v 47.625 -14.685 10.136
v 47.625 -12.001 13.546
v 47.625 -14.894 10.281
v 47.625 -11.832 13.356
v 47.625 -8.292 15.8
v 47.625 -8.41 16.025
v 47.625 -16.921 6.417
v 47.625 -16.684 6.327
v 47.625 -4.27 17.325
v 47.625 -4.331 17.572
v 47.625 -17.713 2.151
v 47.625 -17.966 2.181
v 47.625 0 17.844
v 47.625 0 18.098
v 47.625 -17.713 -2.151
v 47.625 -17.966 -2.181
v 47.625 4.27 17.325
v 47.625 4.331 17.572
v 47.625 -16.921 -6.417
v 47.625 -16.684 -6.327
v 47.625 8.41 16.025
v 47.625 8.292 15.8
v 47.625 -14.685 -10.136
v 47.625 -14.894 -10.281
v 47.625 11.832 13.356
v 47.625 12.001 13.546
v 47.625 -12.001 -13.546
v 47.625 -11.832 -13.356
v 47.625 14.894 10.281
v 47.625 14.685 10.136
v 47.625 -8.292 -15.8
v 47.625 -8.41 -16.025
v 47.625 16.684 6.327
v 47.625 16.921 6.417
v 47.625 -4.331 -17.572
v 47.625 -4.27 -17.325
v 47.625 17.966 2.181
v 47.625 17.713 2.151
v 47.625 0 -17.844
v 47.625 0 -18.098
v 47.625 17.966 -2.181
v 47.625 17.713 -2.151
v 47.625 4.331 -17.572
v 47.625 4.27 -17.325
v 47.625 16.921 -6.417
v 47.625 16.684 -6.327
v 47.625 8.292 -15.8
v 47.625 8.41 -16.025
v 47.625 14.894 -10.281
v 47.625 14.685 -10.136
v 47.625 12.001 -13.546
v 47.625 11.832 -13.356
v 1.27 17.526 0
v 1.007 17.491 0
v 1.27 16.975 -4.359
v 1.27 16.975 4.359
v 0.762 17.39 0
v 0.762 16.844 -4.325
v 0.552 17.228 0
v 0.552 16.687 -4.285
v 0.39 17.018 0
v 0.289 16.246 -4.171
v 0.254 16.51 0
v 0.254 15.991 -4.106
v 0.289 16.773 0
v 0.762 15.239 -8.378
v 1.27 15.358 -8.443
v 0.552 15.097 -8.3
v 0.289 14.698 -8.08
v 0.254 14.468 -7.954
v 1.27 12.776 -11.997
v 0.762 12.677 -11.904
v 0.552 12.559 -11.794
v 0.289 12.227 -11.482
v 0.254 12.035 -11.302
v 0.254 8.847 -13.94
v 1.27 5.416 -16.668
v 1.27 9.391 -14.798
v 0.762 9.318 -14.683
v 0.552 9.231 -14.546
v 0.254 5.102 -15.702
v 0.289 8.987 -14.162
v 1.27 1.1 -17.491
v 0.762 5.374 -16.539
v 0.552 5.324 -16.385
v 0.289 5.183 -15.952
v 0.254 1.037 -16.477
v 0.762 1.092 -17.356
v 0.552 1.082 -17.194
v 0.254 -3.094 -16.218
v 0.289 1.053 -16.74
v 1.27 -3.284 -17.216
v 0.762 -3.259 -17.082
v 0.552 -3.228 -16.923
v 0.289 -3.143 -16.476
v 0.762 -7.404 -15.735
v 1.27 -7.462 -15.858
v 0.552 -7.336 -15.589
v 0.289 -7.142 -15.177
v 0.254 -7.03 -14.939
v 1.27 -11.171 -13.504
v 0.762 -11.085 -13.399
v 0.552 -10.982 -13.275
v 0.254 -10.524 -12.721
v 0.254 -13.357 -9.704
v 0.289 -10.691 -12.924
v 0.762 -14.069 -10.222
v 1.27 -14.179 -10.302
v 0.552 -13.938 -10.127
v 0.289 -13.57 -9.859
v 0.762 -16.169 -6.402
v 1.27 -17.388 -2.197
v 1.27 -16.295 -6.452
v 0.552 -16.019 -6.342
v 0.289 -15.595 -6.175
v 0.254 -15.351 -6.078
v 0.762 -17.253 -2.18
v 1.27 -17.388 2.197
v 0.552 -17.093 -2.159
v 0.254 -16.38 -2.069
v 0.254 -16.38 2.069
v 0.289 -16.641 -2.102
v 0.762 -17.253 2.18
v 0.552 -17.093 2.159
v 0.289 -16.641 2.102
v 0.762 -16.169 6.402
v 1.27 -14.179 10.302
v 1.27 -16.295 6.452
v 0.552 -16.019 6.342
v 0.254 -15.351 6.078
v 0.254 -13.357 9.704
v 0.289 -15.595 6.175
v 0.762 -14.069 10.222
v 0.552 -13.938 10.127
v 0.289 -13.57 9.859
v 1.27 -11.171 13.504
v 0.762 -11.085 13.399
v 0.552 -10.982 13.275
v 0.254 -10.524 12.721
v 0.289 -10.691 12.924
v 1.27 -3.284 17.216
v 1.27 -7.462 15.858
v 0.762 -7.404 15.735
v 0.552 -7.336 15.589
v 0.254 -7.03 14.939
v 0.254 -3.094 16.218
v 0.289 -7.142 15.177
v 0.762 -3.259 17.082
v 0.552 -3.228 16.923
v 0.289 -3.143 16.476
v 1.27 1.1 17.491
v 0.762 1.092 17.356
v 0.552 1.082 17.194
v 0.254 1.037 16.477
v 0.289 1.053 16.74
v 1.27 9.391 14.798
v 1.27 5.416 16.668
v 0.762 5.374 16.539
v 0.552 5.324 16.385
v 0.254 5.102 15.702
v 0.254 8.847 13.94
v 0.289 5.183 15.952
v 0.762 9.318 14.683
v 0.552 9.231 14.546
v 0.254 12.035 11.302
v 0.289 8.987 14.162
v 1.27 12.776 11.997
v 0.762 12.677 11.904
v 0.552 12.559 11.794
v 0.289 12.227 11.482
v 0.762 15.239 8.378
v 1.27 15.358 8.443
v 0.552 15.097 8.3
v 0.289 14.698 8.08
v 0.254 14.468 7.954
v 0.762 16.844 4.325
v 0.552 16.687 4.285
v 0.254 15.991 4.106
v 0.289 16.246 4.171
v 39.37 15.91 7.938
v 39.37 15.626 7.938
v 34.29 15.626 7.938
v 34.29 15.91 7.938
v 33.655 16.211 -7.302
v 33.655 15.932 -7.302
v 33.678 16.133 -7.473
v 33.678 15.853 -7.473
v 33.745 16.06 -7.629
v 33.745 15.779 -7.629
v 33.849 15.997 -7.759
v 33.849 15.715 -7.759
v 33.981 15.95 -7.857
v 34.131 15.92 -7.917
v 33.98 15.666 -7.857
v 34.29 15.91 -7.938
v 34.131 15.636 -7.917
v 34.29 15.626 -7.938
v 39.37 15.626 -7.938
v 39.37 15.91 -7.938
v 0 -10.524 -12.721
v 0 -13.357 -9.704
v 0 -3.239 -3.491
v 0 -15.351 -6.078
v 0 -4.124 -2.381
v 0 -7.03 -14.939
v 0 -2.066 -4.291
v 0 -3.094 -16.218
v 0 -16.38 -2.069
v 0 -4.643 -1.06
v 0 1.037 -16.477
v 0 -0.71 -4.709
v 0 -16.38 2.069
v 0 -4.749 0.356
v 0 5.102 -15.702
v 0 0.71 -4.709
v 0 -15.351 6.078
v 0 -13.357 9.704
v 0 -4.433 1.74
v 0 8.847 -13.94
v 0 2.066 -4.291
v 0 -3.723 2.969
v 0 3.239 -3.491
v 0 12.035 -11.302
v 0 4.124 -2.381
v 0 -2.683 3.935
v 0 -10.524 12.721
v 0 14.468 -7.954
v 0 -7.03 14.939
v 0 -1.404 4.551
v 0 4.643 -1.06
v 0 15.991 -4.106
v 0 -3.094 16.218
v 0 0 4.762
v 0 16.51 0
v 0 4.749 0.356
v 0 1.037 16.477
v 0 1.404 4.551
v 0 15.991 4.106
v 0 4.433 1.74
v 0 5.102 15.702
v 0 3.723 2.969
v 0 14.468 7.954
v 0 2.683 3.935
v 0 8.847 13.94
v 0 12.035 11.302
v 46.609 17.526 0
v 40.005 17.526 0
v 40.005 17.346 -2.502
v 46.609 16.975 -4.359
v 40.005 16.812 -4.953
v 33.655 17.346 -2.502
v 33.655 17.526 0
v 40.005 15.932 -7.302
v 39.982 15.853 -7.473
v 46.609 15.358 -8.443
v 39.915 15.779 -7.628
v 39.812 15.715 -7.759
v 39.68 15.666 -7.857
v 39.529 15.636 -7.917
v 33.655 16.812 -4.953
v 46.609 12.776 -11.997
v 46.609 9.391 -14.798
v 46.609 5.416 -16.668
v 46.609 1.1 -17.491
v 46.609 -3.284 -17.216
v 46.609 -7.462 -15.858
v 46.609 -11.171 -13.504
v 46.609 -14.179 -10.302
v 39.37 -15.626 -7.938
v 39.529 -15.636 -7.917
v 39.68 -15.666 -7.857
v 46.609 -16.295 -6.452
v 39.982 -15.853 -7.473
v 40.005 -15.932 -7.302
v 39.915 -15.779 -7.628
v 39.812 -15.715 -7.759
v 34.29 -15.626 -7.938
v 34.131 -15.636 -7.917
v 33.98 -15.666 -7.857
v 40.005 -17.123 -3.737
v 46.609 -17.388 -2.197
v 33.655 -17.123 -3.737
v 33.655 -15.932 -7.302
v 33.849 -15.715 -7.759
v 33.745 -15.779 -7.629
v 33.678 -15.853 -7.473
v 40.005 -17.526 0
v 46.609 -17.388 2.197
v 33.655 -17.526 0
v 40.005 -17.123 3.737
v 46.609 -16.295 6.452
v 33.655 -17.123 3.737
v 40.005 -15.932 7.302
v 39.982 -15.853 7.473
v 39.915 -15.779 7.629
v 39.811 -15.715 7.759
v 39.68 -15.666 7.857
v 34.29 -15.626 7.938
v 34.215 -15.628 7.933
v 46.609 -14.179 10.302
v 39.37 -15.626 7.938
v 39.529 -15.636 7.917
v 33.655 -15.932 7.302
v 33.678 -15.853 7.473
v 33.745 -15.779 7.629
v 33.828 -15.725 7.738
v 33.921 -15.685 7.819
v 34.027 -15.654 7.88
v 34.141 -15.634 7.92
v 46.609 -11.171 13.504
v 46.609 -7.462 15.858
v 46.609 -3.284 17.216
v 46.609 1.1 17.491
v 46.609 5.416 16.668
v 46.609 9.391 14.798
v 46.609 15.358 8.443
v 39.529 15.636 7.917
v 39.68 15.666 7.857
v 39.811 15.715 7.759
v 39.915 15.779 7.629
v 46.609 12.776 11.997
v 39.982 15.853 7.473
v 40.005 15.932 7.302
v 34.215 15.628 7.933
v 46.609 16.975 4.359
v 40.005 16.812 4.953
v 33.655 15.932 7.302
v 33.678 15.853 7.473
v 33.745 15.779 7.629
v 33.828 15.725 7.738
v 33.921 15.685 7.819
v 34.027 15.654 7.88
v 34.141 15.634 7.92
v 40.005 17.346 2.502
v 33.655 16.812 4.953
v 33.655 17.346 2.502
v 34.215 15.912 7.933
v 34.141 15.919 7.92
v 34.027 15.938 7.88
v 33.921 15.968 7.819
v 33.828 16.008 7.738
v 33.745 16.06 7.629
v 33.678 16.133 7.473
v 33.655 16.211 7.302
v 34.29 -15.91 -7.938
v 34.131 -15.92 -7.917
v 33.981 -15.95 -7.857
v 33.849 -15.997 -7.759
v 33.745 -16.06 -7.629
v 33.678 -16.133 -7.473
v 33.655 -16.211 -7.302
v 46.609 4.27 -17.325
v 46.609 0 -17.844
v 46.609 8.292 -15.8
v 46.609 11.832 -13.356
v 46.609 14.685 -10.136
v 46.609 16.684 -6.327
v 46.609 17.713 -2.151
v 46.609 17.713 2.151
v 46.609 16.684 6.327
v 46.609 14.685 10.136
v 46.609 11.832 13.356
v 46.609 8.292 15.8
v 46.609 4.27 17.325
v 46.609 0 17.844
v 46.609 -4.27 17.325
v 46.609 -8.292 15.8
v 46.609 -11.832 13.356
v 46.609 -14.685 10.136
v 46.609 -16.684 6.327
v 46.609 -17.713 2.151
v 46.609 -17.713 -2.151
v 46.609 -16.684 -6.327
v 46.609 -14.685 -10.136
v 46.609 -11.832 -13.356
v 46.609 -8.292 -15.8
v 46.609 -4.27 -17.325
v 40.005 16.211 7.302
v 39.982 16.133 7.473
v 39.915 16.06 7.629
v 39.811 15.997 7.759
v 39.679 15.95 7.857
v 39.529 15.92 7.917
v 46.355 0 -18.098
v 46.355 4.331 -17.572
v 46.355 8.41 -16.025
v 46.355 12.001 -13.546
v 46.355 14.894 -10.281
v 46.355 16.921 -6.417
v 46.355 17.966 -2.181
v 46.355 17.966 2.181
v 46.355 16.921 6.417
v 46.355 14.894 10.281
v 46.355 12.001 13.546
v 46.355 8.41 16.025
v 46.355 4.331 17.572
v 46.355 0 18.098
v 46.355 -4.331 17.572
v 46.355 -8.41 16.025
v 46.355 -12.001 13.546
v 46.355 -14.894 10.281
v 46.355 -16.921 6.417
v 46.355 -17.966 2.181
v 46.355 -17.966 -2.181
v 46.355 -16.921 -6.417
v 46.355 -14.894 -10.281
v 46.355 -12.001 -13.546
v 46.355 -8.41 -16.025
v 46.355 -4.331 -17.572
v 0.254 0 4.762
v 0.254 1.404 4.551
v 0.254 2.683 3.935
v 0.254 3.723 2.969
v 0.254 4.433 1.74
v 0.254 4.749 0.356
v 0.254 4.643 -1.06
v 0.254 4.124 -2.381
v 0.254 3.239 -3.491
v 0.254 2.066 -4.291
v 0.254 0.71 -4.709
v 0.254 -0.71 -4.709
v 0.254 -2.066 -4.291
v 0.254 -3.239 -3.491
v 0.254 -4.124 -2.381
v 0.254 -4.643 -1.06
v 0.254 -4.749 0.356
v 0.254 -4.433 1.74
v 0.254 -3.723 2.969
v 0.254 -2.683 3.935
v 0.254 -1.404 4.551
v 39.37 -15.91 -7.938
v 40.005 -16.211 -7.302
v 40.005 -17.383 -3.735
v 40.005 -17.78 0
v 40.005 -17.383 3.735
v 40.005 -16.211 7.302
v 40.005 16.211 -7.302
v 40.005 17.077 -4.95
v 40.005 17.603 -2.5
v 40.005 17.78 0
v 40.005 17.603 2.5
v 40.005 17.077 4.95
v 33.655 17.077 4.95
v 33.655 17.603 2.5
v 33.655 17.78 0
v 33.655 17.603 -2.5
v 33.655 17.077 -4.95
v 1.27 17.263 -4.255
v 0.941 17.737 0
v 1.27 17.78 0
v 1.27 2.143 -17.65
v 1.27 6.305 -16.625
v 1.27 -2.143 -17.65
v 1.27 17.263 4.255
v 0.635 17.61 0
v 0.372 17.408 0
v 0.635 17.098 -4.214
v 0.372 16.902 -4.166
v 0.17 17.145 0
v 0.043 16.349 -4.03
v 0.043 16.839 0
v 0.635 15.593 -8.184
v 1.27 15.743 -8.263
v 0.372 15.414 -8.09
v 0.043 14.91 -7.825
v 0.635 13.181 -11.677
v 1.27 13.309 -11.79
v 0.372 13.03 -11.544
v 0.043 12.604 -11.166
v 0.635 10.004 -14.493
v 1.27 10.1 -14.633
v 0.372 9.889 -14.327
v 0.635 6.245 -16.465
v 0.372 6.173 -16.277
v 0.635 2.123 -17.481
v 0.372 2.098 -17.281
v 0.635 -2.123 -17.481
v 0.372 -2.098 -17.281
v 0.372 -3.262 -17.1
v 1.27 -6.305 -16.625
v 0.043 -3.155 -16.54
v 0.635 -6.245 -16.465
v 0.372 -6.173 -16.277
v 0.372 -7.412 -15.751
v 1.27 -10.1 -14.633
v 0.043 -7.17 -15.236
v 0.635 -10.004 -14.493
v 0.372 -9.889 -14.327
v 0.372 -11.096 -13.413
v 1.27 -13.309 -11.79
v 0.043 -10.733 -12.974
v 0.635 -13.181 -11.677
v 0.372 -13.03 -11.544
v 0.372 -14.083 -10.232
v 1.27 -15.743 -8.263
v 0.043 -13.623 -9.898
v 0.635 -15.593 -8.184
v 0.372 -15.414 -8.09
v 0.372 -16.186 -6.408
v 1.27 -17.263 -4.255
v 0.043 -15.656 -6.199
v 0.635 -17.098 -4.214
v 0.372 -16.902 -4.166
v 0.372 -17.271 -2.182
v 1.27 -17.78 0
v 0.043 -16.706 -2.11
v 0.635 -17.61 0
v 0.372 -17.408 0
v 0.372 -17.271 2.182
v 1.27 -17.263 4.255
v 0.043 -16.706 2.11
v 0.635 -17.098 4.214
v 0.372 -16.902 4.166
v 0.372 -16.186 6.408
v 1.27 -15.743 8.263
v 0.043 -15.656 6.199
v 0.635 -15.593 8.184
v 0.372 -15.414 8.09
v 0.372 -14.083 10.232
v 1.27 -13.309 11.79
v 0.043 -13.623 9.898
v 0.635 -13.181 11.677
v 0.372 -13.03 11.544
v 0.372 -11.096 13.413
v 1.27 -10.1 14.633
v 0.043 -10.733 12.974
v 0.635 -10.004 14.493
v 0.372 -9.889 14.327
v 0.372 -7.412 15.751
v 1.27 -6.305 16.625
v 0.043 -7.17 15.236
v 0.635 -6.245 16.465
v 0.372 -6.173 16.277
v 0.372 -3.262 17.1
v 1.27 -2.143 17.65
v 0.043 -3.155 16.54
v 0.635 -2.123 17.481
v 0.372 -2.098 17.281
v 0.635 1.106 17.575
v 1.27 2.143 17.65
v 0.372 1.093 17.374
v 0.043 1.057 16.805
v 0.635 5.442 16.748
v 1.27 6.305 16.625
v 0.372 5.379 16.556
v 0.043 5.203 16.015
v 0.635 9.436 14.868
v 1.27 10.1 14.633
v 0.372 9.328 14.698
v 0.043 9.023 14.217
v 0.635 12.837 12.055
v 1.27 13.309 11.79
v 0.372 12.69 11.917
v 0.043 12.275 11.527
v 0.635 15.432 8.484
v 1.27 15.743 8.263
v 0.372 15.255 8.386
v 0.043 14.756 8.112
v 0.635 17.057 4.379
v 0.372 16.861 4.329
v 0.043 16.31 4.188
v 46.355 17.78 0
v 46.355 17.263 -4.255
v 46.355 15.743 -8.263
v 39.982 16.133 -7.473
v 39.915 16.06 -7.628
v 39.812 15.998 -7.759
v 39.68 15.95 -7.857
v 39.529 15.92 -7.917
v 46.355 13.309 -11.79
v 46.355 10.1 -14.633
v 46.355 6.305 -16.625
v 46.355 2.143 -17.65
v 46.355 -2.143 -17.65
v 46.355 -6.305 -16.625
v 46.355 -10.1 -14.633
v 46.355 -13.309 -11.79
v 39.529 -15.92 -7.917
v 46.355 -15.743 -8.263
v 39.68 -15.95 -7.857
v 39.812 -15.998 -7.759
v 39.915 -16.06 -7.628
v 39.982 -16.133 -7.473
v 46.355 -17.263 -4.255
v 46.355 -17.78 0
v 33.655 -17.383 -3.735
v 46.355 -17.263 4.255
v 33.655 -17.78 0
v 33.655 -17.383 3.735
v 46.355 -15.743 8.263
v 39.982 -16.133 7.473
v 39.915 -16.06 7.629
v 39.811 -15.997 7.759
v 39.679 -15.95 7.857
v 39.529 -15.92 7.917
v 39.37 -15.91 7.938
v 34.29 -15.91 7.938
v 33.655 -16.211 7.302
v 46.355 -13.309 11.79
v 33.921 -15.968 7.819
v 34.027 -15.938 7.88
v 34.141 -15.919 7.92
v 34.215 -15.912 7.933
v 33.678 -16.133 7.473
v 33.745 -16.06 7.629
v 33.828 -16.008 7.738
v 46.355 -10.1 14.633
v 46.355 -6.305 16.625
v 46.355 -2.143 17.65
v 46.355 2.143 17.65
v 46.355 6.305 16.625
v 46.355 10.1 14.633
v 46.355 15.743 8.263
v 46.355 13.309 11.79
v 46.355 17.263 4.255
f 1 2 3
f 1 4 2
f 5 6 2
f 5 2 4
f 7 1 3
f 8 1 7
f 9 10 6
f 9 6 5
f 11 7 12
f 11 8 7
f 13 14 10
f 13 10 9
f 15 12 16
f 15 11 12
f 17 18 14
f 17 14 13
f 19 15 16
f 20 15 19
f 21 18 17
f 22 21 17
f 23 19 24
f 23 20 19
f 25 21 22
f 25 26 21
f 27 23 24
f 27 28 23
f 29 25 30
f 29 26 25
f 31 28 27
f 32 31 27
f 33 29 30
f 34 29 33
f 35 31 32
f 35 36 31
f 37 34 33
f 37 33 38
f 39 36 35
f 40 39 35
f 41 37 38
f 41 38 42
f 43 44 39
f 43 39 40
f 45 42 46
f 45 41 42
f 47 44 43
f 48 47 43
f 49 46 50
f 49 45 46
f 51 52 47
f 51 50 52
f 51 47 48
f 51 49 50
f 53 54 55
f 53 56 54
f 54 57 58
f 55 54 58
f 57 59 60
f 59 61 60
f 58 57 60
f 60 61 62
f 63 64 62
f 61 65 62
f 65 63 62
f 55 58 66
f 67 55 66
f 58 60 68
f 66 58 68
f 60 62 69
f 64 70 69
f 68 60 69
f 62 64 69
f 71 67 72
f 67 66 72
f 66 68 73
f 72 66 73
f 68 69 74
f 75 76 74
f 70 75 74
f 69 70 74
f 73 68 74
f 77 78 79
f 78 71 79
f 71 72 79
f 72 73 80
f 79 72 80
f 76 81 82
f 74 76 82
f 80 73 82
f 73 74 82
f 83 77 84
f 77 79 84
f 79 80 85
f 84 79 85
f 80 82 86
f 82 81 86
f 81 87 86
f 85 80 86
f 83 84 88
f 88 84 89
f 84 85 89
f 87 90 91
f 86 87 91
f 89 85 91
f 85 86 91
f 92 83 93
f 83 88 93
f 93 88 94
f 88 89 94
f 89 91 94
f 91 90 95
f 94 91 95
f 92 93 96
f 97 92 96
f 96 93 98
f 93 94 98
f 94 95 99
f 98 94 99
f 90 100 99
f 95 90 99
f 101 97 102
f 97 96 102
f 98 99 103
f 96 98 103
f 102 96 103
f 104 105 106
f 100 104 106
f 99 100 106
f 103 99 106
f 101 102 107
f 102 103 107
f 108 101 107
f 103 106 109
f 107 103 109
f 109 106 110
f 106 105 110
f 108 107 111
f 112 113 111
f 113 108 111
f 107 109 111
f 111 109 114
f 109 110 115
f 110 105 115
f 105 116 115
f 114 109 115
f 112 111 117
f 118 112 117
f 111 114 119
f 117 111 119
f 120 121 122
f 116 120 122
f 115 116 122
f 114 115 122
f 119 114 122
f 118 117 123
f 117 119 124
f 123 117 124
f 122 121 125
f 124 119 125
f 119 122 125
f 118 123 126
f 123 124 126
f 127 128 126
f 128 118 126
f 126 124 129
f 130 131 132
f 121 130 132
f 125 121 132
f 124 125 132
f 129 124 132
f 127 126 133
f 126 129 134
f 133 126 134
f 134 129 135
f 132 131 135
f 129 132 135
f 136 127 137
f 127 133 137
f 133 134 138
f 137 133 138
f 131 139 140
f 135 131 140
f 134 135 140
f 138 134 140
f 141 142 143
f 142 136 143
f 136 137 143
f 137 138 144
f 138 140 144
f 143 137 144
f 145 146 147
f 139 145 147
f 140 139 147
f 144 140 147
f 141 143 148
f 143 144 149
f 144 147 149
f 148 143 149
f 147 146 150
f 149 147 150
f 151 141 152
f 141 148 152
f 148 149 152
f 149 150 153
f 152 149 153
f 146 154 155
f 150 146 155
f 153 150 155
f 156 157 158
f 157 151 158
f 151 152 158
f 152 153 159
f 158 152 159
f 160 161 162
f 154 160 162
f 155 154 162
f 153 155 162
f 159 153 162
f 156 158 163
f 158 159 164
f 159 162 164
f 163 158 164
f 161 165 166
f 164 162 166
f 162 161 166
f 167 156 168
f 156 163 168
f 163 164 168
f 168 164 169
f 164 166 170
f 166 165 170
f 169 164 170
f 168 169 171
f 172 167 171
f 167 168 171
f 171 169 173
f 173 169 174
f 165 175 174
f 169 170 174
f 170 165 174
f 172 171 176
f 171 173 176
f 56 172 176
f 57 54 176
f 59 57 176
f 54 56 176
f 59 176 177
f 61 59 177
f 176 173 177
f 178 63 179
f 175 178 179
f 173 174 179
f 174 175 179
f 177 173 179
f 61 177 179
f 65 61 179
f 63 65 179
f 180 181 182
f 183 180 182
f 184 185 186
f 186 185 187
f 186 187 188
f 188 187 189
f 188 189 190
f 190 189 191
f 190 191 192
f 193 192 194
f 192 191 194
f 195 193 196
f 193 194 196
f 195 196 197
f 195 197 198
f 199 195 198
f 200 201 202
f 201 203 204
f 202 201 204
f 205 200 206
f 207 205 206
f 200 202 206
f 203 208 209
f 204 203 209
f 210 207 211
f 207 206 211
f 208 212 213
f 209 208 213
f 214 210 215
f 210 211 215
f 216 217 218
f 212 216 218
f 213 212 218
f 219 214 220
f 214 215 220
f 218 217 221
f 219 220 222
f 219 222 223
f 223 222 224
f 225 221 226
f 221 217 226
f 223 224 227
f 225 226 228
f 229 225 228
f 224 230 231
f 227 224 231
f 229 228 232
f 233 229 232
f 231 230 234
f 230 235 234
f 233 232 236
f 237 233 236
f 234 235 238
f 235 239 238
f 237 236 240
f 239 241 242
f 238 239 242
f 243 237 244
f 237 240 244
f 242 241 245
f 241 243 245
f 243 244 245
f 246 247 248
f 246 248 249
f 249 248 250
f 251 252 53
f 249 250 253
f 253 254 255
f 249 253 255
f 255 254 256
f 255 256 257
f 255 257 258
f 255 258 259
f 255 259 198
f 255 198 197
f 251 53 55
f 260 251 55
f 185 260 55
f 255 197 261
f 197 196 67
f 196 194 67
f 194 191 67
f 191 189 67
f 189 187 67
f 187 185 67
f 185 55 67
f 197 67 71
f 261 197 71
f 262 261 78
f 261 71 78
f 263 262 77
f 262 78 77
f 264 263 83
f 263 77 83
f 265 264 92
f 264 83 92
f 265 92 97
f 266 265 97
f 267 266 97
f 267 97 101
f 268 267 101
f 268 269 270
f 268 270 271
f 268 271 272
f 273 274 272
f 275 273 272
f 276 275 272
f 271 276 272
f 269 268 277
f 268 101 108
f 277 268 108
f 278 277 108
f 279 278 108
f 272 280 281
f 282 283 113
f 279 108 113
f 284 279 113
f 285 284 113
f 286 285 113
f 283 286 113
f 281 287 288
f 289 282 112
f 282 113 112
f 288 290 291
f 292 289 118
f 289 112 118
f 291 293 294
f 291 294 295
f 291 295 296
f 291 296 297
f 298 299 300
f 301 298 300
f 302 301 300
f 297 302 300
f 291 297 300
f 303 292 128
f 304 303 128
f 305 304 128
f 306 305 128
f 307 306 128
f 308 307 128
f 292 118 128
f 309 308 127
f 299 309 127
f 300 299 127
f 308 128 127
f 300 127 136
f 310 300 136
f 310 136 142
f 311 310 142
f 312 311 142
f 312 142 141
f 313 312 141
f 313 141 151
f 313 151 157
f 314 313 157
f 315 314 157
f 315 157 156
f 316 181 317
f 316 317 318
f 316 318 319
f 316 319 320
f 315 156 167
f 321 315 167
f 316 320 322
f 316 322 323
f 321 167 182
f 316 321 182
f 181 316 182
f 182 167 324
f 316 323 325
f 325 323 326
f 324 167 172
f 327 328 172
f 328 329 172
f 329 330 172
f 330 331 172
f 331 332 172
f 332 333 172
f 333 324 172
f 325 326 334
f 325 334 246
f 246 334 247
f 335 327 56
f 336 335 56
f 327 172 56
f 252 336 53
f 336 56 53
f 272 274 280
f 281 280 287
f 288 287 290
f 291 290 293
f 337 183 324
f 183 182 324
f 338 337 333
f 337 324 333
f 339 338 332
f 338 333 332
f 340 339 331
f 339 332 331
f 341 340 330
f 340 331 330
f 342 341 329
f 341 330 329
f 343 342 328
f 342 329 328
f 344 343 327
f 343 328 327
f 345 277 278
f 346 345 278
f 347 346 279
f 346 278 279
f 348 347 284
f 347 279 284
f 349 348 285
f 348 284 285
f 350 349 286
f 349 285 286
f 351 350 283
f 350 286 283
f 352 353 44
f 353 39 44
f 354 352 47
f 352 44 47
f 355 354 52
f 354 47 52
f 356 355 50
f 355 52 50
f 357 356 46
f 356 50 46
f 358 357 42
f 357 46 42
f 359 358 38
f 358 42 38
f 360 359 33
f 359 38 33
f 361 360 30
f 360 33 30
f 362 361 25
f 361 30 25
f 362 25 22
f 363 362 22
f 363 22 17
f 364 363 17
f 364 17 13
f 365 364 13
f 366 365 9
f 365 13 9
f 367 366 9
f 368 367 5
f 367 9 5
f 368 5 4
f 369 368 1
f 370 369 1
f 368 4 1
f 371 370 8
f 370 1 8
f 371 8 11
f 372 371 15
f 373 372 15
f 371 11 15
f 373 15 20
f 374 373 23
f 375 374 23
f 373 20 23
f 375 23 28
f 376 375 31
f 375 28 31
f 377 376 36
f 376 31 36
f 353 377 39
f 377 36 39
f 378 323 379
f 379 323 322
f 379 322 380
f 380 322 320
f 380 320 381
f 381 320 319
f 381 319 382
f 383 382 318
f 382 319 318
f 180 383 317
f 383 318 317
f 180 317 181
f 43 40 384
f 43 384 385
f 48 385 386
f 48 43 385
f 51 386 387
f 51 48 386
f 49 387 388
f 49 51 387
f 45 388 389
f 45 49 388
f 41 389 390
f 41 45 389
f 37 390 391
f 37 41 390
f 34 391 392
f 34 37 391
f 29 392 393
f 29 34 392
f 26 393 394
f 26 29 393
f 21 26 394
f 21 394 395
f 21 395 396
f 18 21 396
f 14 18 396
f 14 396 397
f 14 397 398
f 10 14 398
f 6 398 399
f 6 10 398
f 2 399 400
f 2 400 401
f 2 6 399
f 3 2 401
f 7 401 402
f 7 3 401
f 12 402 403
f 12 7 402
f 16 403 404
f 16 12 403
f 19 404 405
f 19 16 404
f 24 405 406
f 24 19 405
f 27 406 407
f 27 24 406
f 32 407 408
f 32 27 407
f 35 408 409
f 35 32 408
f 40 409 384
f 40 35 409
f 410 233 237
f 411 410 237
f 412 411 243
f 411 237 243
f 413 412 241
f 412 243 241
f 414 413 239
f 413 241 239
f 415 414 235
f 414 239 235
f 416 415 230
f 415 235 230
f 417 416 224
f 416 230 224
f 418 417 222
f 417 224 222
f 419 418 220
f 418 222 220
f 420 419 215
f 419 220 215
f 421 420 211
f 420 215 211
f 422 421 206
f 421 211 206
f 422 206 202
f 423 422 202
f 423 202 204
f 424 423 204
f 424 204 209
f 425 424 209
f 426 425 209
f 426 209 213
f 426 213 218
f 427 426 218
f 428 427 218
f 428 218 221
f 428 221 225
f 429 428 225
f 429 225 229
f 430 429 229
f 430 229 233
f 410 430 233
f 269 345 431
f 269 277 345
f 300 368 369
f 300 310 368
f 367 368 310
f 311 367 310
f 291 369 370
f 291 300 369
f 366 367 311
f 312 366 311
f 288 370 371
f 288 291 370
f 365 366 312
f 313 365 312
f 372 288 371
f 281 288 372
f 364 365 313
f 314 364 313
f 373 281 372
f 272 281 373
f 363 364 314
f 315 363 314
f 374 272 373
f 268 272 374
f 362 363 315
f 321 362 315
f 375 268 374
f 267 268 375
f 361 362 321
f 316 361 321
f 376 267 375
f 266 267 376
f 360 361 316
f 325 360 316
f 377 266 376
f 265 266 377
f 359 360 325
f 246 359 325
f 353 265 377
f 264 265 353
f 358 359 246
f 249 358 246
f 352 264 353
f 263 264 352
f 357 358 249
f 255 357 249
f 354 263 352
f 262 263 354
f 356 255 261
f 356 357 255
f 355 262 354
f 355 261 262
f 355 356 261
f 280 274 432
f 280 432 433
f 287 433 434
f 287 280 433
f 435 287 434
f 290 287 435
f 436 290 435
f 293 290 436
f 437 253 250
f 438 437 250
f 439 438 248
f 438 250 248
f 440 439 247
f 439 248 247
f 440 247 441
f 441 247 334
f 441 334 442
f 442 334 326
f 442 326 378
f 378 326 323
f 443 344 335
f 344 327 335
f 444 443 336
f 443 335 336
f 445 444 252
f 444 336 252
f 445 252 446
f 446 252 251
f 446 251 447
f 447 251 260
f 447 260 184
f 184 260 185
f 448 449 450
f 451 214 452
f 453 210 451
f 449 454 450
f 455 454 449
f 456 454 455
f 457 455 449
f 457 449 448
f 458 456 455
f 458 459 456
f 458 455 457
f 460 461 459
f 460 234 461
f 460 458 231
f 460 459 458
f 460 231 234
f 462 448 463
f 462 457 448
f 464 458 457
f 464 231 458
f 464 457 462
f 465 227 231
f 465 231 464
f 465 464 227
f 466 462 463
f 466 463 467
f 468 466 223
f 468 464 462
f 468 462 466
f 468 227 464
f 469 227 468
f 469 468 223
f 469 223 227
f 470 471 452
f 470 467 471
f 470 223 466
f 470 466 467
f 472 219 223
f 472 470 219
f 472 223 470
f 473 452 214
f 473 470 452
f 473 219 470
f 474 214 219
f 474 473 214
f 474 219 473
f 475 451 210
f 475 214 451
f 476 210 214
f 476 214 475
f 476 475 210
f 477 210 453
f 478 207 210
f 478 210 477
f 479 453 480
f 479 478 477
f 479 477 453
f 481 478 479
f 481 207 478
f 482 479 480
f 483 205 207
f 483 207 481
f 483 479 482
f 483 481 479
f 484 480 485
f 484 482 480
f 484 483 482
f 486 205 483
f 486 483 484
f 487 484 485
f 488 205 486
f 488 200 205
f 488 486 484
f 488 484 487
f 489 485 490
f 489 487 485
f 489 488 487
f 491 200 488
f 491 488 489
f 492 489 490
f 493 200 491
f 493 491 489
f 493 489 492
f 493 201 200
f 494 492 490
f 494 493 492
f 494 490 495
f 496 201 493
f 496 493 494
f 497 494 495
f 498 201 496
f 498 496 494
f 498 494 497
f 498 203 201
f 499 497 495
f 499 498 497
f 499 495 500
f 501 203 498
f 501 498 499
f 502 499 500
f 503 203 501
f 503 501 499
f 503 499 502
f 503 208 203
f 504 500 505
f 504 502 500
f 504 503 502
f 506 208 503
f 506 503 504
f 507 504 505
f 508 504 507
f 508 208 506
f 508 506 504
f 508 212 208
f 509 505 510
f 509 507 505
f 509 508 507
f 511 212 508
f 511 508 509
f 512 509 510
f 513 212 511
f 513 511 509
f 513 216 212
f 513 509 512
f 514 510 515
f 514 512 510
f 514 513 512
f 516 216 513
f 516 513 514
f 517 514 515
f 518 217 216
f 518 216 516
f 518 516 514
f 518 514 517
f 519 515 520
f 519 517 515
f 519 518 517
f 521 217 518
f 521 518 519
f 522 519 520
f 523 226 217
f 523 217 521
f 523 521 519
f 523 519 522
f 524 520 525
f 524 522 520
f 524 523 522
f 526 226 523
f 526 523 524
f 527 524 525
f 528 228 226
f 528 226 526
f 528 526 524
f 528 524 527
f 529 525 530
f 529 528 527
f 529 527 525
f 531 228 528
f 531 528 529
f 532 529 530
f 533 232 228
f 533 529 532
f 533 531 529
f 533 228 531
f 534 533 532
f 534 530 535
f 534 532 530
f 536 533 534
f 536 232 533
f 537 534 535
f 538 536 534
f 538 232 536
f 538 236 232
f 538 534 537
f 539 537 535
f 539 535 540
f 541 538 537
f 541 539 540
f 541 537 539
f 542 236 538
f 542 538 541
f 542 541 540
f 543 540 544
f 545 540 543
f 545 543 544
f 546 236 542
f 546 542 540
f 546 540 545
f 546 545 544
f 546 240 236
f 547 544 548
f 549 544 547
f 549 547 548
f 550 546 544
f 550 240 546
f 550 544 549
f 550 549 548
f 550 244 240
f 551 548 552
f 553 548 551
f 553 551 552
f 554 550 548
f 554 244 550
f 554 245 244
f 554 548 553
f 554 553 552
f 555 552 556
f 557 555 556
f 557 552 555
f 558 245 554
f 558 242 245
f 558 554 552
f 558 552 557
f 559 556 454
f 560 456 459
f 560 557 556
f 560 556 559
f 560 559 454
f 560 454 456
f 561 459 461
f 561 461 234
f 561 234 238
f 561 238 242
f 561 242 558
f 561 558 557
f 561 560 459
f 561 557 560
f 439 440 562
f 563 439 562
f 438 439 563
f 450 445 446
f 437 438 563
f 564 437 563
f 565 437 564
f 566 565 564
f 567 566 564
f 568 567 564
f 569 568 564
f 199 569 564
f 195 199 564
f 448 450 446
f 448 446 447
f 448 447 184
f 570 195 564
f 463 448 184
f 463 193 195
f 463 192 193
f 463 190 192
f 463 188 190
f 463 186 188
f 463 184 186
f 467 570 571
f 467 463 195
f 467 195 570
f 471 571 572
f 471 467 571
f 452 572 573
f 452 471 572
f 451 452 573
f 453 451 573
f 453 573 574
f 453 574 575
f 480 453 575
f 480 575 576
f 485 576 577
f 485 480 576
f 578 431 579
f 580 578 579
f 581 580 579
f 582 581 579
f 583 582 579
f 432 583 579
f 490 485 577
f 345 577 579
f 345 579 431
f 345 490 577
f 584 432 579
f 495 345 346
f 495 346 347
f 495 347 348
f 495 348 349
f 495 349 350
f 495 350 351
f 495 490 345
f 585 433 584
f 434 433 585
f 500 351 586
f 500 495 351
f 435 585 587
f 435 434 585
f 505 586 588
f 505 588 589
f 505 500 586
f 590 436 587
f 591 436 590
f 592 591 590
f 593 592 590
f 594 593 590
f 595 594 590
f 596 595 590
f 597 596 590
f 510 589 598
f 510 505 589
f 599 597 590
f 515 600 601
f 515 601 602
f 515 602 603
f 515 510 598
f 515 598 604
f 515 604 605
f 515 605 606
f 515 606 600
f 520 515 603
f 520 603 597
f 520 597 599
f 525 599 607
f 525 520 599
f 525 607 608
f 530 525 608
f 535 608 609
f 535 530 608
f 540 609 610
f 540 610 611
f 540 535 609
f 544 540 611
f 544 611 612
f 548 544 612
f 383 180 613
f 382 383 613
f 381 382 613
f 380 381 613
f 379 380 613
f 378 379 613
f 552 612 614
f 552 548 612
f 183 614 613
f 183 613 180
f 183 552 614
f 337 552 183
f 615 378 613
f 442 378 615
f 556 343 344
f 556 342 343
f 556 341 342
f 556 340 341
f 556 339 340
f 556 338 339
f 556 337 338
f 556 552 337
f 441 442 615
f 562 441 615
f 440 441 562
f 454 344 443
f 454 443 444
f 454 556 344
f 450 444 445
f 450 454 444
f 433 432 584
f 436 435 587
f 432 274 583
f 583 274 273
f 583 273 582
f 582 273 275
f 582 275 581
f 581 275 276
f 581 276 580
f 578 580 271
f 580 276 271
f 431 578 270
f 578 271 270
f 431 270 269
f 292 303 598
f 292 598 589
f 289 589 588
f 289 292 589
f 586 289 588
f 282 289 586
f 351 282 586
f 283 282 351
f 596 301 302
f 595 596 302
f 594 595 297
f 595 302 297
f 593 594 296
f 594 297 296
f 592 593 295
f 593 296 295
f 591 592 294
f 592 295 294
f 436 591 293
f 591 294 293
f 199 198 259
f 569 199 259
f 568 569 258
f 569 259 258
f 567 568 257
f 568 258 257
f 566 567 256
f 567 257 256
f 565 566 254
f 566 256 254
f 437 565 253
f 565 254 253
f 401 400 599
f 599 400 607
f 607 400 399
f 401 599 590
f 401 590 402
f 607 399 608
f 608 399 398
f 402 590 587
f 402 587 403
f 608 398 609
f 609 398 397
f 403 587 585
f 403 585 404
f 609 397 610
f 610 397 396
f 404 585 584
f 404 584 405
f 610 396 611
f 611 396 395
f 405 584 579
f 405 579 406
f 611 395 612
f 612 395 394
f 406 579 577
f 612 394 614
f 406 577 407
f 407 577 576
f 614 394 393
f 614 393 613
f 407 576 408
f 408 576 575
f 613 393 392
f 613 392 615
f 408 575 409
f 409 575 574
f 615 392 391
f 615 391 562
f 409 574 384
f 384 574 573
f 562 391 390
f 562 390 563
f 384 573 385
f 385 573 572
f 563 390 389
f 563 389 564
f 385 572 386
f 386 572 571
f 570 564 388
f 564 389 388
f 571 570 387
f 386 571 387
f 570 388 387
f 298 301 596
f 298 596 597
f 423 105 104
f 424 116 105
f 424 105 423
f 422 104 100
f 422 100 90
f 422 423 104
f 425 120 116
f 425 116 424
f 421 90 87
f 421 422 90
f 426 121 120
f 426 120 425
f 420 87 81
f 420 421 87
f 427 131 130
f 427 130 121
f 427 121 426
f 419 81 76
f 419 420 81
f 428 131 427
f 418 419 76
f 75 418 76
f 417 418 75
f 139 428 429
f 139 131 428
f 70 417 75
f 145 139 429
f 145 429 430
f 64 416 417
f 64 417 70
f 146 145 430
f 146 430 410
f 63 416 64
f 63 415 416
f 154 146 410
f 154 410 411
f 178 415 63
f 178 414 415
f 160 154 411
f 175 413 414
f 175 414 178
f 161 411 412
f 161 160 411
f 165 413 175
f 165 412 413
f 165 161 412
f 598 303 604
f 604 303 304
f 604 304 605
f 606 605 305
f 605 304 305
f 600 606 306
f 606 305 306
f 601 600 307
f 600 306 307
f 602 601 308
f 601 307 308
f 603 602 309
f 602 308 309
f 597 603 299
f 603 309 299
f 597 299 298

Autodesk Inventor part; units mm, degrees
ref_plane "YZ Plane" through (0, 0, 0) normal (1, 0, 0) x (0, 1, 0)
ref_plane "XZ Plane" through (0, 0, 0) normal (0, 1, 0) x (-1, 0, 0)
ref_plane "XY Plane" through (0, 0, 0) normal (0, 0, 1) x (1, 0, 0)
sketch "Sketch1" plane through (0, 0, 0) normal (1, 0, 0) x (0, 1, 0)
  circle A0 centre (0, 0) radius 17.78
  dimension "d0" = 35.56
extrude "Extrusion1" add sketch "Sketch1" along normal blind 47.625
fillet "Fillet1" radius 1.27 1 edges at (0, -17.78, 0)
sketch "Sketch2" plane through (0, 0, 0) normal (0, 1, 0) x (-1, 0, 0)
  line L0 (-34.29, -7.9375) -> (-39.37, -7.9375)
  line L1 (-40.005, -7.3025) -> (-40.005, 7.3025)
  line L2 (-39.37, 7.9375) -> (-34.29, 7.9375)
  line L3 (-33.655, 7.3025) -> (-33.655, -7.3025)
  line L4 (-47.625, 17.78) -> (-47.625, -17.78) projected
  arc A0 (-40.005, -7.3025) -> (-39.37, -7.9375) centre (-39.37, -7.3025) ccw
  arc A1 (-34.29, -7.9375) -> (-33.655, -7.3025) centre (-34.29, -7.3025) ccw
  arc A2 (-33.655, 7.3025) -> (-34.29, 7.9375) centre (-34.29, 7.3025) ccw
  arc A3 (-39.37, 7.9375) -> (-40.005, 7.3025) centre (-39.37, 7.3025) ccw
  point P0 (0, 0)
  point P1 (-33.655, -7.9375)
  point P2 (-40.005, 7.9375)
  point P3 (-40.005, -7.9375)
  point P4 (-33.655, 7.9375)
  dimension "d4" = 15.875
  dimension "d5" = 6.35
  dimension "d6" = 7.62
  dimension "d7" = 9.8425
  dimension "d14" = 0.635
sketch "Sketch3" plane through (47.625, 0, 0) normal (1, 0, 0) x (0, 0, -1)
  circle A0 centre (0, 0) radius 18.0975
  dimension "d11" = 36.195
extrude "Extrusion3" add sketch "Sketch3" against normal blind 1.27
shell "Shell2" thickness 0.254 removed faces 1 at (47.625, -0.1965, 3.481)
extrude "Extrusion2" cut sketch "Sketch2" along normal up to next
sketch "Sketch4" plane through (0, 0, 0) normal (-1, 0, 0) x (0, 0, 1)
  circle A0 centre (0, 0) radius 4.7625
  dimension "d16" = 9.525
extrude "Extrusion4" cut sketch "Sketch4" against normal up to next
extrude "Extrusion5" cut sketch "Sketch2" against normal up to next
properties part number "Motor-Casing"
